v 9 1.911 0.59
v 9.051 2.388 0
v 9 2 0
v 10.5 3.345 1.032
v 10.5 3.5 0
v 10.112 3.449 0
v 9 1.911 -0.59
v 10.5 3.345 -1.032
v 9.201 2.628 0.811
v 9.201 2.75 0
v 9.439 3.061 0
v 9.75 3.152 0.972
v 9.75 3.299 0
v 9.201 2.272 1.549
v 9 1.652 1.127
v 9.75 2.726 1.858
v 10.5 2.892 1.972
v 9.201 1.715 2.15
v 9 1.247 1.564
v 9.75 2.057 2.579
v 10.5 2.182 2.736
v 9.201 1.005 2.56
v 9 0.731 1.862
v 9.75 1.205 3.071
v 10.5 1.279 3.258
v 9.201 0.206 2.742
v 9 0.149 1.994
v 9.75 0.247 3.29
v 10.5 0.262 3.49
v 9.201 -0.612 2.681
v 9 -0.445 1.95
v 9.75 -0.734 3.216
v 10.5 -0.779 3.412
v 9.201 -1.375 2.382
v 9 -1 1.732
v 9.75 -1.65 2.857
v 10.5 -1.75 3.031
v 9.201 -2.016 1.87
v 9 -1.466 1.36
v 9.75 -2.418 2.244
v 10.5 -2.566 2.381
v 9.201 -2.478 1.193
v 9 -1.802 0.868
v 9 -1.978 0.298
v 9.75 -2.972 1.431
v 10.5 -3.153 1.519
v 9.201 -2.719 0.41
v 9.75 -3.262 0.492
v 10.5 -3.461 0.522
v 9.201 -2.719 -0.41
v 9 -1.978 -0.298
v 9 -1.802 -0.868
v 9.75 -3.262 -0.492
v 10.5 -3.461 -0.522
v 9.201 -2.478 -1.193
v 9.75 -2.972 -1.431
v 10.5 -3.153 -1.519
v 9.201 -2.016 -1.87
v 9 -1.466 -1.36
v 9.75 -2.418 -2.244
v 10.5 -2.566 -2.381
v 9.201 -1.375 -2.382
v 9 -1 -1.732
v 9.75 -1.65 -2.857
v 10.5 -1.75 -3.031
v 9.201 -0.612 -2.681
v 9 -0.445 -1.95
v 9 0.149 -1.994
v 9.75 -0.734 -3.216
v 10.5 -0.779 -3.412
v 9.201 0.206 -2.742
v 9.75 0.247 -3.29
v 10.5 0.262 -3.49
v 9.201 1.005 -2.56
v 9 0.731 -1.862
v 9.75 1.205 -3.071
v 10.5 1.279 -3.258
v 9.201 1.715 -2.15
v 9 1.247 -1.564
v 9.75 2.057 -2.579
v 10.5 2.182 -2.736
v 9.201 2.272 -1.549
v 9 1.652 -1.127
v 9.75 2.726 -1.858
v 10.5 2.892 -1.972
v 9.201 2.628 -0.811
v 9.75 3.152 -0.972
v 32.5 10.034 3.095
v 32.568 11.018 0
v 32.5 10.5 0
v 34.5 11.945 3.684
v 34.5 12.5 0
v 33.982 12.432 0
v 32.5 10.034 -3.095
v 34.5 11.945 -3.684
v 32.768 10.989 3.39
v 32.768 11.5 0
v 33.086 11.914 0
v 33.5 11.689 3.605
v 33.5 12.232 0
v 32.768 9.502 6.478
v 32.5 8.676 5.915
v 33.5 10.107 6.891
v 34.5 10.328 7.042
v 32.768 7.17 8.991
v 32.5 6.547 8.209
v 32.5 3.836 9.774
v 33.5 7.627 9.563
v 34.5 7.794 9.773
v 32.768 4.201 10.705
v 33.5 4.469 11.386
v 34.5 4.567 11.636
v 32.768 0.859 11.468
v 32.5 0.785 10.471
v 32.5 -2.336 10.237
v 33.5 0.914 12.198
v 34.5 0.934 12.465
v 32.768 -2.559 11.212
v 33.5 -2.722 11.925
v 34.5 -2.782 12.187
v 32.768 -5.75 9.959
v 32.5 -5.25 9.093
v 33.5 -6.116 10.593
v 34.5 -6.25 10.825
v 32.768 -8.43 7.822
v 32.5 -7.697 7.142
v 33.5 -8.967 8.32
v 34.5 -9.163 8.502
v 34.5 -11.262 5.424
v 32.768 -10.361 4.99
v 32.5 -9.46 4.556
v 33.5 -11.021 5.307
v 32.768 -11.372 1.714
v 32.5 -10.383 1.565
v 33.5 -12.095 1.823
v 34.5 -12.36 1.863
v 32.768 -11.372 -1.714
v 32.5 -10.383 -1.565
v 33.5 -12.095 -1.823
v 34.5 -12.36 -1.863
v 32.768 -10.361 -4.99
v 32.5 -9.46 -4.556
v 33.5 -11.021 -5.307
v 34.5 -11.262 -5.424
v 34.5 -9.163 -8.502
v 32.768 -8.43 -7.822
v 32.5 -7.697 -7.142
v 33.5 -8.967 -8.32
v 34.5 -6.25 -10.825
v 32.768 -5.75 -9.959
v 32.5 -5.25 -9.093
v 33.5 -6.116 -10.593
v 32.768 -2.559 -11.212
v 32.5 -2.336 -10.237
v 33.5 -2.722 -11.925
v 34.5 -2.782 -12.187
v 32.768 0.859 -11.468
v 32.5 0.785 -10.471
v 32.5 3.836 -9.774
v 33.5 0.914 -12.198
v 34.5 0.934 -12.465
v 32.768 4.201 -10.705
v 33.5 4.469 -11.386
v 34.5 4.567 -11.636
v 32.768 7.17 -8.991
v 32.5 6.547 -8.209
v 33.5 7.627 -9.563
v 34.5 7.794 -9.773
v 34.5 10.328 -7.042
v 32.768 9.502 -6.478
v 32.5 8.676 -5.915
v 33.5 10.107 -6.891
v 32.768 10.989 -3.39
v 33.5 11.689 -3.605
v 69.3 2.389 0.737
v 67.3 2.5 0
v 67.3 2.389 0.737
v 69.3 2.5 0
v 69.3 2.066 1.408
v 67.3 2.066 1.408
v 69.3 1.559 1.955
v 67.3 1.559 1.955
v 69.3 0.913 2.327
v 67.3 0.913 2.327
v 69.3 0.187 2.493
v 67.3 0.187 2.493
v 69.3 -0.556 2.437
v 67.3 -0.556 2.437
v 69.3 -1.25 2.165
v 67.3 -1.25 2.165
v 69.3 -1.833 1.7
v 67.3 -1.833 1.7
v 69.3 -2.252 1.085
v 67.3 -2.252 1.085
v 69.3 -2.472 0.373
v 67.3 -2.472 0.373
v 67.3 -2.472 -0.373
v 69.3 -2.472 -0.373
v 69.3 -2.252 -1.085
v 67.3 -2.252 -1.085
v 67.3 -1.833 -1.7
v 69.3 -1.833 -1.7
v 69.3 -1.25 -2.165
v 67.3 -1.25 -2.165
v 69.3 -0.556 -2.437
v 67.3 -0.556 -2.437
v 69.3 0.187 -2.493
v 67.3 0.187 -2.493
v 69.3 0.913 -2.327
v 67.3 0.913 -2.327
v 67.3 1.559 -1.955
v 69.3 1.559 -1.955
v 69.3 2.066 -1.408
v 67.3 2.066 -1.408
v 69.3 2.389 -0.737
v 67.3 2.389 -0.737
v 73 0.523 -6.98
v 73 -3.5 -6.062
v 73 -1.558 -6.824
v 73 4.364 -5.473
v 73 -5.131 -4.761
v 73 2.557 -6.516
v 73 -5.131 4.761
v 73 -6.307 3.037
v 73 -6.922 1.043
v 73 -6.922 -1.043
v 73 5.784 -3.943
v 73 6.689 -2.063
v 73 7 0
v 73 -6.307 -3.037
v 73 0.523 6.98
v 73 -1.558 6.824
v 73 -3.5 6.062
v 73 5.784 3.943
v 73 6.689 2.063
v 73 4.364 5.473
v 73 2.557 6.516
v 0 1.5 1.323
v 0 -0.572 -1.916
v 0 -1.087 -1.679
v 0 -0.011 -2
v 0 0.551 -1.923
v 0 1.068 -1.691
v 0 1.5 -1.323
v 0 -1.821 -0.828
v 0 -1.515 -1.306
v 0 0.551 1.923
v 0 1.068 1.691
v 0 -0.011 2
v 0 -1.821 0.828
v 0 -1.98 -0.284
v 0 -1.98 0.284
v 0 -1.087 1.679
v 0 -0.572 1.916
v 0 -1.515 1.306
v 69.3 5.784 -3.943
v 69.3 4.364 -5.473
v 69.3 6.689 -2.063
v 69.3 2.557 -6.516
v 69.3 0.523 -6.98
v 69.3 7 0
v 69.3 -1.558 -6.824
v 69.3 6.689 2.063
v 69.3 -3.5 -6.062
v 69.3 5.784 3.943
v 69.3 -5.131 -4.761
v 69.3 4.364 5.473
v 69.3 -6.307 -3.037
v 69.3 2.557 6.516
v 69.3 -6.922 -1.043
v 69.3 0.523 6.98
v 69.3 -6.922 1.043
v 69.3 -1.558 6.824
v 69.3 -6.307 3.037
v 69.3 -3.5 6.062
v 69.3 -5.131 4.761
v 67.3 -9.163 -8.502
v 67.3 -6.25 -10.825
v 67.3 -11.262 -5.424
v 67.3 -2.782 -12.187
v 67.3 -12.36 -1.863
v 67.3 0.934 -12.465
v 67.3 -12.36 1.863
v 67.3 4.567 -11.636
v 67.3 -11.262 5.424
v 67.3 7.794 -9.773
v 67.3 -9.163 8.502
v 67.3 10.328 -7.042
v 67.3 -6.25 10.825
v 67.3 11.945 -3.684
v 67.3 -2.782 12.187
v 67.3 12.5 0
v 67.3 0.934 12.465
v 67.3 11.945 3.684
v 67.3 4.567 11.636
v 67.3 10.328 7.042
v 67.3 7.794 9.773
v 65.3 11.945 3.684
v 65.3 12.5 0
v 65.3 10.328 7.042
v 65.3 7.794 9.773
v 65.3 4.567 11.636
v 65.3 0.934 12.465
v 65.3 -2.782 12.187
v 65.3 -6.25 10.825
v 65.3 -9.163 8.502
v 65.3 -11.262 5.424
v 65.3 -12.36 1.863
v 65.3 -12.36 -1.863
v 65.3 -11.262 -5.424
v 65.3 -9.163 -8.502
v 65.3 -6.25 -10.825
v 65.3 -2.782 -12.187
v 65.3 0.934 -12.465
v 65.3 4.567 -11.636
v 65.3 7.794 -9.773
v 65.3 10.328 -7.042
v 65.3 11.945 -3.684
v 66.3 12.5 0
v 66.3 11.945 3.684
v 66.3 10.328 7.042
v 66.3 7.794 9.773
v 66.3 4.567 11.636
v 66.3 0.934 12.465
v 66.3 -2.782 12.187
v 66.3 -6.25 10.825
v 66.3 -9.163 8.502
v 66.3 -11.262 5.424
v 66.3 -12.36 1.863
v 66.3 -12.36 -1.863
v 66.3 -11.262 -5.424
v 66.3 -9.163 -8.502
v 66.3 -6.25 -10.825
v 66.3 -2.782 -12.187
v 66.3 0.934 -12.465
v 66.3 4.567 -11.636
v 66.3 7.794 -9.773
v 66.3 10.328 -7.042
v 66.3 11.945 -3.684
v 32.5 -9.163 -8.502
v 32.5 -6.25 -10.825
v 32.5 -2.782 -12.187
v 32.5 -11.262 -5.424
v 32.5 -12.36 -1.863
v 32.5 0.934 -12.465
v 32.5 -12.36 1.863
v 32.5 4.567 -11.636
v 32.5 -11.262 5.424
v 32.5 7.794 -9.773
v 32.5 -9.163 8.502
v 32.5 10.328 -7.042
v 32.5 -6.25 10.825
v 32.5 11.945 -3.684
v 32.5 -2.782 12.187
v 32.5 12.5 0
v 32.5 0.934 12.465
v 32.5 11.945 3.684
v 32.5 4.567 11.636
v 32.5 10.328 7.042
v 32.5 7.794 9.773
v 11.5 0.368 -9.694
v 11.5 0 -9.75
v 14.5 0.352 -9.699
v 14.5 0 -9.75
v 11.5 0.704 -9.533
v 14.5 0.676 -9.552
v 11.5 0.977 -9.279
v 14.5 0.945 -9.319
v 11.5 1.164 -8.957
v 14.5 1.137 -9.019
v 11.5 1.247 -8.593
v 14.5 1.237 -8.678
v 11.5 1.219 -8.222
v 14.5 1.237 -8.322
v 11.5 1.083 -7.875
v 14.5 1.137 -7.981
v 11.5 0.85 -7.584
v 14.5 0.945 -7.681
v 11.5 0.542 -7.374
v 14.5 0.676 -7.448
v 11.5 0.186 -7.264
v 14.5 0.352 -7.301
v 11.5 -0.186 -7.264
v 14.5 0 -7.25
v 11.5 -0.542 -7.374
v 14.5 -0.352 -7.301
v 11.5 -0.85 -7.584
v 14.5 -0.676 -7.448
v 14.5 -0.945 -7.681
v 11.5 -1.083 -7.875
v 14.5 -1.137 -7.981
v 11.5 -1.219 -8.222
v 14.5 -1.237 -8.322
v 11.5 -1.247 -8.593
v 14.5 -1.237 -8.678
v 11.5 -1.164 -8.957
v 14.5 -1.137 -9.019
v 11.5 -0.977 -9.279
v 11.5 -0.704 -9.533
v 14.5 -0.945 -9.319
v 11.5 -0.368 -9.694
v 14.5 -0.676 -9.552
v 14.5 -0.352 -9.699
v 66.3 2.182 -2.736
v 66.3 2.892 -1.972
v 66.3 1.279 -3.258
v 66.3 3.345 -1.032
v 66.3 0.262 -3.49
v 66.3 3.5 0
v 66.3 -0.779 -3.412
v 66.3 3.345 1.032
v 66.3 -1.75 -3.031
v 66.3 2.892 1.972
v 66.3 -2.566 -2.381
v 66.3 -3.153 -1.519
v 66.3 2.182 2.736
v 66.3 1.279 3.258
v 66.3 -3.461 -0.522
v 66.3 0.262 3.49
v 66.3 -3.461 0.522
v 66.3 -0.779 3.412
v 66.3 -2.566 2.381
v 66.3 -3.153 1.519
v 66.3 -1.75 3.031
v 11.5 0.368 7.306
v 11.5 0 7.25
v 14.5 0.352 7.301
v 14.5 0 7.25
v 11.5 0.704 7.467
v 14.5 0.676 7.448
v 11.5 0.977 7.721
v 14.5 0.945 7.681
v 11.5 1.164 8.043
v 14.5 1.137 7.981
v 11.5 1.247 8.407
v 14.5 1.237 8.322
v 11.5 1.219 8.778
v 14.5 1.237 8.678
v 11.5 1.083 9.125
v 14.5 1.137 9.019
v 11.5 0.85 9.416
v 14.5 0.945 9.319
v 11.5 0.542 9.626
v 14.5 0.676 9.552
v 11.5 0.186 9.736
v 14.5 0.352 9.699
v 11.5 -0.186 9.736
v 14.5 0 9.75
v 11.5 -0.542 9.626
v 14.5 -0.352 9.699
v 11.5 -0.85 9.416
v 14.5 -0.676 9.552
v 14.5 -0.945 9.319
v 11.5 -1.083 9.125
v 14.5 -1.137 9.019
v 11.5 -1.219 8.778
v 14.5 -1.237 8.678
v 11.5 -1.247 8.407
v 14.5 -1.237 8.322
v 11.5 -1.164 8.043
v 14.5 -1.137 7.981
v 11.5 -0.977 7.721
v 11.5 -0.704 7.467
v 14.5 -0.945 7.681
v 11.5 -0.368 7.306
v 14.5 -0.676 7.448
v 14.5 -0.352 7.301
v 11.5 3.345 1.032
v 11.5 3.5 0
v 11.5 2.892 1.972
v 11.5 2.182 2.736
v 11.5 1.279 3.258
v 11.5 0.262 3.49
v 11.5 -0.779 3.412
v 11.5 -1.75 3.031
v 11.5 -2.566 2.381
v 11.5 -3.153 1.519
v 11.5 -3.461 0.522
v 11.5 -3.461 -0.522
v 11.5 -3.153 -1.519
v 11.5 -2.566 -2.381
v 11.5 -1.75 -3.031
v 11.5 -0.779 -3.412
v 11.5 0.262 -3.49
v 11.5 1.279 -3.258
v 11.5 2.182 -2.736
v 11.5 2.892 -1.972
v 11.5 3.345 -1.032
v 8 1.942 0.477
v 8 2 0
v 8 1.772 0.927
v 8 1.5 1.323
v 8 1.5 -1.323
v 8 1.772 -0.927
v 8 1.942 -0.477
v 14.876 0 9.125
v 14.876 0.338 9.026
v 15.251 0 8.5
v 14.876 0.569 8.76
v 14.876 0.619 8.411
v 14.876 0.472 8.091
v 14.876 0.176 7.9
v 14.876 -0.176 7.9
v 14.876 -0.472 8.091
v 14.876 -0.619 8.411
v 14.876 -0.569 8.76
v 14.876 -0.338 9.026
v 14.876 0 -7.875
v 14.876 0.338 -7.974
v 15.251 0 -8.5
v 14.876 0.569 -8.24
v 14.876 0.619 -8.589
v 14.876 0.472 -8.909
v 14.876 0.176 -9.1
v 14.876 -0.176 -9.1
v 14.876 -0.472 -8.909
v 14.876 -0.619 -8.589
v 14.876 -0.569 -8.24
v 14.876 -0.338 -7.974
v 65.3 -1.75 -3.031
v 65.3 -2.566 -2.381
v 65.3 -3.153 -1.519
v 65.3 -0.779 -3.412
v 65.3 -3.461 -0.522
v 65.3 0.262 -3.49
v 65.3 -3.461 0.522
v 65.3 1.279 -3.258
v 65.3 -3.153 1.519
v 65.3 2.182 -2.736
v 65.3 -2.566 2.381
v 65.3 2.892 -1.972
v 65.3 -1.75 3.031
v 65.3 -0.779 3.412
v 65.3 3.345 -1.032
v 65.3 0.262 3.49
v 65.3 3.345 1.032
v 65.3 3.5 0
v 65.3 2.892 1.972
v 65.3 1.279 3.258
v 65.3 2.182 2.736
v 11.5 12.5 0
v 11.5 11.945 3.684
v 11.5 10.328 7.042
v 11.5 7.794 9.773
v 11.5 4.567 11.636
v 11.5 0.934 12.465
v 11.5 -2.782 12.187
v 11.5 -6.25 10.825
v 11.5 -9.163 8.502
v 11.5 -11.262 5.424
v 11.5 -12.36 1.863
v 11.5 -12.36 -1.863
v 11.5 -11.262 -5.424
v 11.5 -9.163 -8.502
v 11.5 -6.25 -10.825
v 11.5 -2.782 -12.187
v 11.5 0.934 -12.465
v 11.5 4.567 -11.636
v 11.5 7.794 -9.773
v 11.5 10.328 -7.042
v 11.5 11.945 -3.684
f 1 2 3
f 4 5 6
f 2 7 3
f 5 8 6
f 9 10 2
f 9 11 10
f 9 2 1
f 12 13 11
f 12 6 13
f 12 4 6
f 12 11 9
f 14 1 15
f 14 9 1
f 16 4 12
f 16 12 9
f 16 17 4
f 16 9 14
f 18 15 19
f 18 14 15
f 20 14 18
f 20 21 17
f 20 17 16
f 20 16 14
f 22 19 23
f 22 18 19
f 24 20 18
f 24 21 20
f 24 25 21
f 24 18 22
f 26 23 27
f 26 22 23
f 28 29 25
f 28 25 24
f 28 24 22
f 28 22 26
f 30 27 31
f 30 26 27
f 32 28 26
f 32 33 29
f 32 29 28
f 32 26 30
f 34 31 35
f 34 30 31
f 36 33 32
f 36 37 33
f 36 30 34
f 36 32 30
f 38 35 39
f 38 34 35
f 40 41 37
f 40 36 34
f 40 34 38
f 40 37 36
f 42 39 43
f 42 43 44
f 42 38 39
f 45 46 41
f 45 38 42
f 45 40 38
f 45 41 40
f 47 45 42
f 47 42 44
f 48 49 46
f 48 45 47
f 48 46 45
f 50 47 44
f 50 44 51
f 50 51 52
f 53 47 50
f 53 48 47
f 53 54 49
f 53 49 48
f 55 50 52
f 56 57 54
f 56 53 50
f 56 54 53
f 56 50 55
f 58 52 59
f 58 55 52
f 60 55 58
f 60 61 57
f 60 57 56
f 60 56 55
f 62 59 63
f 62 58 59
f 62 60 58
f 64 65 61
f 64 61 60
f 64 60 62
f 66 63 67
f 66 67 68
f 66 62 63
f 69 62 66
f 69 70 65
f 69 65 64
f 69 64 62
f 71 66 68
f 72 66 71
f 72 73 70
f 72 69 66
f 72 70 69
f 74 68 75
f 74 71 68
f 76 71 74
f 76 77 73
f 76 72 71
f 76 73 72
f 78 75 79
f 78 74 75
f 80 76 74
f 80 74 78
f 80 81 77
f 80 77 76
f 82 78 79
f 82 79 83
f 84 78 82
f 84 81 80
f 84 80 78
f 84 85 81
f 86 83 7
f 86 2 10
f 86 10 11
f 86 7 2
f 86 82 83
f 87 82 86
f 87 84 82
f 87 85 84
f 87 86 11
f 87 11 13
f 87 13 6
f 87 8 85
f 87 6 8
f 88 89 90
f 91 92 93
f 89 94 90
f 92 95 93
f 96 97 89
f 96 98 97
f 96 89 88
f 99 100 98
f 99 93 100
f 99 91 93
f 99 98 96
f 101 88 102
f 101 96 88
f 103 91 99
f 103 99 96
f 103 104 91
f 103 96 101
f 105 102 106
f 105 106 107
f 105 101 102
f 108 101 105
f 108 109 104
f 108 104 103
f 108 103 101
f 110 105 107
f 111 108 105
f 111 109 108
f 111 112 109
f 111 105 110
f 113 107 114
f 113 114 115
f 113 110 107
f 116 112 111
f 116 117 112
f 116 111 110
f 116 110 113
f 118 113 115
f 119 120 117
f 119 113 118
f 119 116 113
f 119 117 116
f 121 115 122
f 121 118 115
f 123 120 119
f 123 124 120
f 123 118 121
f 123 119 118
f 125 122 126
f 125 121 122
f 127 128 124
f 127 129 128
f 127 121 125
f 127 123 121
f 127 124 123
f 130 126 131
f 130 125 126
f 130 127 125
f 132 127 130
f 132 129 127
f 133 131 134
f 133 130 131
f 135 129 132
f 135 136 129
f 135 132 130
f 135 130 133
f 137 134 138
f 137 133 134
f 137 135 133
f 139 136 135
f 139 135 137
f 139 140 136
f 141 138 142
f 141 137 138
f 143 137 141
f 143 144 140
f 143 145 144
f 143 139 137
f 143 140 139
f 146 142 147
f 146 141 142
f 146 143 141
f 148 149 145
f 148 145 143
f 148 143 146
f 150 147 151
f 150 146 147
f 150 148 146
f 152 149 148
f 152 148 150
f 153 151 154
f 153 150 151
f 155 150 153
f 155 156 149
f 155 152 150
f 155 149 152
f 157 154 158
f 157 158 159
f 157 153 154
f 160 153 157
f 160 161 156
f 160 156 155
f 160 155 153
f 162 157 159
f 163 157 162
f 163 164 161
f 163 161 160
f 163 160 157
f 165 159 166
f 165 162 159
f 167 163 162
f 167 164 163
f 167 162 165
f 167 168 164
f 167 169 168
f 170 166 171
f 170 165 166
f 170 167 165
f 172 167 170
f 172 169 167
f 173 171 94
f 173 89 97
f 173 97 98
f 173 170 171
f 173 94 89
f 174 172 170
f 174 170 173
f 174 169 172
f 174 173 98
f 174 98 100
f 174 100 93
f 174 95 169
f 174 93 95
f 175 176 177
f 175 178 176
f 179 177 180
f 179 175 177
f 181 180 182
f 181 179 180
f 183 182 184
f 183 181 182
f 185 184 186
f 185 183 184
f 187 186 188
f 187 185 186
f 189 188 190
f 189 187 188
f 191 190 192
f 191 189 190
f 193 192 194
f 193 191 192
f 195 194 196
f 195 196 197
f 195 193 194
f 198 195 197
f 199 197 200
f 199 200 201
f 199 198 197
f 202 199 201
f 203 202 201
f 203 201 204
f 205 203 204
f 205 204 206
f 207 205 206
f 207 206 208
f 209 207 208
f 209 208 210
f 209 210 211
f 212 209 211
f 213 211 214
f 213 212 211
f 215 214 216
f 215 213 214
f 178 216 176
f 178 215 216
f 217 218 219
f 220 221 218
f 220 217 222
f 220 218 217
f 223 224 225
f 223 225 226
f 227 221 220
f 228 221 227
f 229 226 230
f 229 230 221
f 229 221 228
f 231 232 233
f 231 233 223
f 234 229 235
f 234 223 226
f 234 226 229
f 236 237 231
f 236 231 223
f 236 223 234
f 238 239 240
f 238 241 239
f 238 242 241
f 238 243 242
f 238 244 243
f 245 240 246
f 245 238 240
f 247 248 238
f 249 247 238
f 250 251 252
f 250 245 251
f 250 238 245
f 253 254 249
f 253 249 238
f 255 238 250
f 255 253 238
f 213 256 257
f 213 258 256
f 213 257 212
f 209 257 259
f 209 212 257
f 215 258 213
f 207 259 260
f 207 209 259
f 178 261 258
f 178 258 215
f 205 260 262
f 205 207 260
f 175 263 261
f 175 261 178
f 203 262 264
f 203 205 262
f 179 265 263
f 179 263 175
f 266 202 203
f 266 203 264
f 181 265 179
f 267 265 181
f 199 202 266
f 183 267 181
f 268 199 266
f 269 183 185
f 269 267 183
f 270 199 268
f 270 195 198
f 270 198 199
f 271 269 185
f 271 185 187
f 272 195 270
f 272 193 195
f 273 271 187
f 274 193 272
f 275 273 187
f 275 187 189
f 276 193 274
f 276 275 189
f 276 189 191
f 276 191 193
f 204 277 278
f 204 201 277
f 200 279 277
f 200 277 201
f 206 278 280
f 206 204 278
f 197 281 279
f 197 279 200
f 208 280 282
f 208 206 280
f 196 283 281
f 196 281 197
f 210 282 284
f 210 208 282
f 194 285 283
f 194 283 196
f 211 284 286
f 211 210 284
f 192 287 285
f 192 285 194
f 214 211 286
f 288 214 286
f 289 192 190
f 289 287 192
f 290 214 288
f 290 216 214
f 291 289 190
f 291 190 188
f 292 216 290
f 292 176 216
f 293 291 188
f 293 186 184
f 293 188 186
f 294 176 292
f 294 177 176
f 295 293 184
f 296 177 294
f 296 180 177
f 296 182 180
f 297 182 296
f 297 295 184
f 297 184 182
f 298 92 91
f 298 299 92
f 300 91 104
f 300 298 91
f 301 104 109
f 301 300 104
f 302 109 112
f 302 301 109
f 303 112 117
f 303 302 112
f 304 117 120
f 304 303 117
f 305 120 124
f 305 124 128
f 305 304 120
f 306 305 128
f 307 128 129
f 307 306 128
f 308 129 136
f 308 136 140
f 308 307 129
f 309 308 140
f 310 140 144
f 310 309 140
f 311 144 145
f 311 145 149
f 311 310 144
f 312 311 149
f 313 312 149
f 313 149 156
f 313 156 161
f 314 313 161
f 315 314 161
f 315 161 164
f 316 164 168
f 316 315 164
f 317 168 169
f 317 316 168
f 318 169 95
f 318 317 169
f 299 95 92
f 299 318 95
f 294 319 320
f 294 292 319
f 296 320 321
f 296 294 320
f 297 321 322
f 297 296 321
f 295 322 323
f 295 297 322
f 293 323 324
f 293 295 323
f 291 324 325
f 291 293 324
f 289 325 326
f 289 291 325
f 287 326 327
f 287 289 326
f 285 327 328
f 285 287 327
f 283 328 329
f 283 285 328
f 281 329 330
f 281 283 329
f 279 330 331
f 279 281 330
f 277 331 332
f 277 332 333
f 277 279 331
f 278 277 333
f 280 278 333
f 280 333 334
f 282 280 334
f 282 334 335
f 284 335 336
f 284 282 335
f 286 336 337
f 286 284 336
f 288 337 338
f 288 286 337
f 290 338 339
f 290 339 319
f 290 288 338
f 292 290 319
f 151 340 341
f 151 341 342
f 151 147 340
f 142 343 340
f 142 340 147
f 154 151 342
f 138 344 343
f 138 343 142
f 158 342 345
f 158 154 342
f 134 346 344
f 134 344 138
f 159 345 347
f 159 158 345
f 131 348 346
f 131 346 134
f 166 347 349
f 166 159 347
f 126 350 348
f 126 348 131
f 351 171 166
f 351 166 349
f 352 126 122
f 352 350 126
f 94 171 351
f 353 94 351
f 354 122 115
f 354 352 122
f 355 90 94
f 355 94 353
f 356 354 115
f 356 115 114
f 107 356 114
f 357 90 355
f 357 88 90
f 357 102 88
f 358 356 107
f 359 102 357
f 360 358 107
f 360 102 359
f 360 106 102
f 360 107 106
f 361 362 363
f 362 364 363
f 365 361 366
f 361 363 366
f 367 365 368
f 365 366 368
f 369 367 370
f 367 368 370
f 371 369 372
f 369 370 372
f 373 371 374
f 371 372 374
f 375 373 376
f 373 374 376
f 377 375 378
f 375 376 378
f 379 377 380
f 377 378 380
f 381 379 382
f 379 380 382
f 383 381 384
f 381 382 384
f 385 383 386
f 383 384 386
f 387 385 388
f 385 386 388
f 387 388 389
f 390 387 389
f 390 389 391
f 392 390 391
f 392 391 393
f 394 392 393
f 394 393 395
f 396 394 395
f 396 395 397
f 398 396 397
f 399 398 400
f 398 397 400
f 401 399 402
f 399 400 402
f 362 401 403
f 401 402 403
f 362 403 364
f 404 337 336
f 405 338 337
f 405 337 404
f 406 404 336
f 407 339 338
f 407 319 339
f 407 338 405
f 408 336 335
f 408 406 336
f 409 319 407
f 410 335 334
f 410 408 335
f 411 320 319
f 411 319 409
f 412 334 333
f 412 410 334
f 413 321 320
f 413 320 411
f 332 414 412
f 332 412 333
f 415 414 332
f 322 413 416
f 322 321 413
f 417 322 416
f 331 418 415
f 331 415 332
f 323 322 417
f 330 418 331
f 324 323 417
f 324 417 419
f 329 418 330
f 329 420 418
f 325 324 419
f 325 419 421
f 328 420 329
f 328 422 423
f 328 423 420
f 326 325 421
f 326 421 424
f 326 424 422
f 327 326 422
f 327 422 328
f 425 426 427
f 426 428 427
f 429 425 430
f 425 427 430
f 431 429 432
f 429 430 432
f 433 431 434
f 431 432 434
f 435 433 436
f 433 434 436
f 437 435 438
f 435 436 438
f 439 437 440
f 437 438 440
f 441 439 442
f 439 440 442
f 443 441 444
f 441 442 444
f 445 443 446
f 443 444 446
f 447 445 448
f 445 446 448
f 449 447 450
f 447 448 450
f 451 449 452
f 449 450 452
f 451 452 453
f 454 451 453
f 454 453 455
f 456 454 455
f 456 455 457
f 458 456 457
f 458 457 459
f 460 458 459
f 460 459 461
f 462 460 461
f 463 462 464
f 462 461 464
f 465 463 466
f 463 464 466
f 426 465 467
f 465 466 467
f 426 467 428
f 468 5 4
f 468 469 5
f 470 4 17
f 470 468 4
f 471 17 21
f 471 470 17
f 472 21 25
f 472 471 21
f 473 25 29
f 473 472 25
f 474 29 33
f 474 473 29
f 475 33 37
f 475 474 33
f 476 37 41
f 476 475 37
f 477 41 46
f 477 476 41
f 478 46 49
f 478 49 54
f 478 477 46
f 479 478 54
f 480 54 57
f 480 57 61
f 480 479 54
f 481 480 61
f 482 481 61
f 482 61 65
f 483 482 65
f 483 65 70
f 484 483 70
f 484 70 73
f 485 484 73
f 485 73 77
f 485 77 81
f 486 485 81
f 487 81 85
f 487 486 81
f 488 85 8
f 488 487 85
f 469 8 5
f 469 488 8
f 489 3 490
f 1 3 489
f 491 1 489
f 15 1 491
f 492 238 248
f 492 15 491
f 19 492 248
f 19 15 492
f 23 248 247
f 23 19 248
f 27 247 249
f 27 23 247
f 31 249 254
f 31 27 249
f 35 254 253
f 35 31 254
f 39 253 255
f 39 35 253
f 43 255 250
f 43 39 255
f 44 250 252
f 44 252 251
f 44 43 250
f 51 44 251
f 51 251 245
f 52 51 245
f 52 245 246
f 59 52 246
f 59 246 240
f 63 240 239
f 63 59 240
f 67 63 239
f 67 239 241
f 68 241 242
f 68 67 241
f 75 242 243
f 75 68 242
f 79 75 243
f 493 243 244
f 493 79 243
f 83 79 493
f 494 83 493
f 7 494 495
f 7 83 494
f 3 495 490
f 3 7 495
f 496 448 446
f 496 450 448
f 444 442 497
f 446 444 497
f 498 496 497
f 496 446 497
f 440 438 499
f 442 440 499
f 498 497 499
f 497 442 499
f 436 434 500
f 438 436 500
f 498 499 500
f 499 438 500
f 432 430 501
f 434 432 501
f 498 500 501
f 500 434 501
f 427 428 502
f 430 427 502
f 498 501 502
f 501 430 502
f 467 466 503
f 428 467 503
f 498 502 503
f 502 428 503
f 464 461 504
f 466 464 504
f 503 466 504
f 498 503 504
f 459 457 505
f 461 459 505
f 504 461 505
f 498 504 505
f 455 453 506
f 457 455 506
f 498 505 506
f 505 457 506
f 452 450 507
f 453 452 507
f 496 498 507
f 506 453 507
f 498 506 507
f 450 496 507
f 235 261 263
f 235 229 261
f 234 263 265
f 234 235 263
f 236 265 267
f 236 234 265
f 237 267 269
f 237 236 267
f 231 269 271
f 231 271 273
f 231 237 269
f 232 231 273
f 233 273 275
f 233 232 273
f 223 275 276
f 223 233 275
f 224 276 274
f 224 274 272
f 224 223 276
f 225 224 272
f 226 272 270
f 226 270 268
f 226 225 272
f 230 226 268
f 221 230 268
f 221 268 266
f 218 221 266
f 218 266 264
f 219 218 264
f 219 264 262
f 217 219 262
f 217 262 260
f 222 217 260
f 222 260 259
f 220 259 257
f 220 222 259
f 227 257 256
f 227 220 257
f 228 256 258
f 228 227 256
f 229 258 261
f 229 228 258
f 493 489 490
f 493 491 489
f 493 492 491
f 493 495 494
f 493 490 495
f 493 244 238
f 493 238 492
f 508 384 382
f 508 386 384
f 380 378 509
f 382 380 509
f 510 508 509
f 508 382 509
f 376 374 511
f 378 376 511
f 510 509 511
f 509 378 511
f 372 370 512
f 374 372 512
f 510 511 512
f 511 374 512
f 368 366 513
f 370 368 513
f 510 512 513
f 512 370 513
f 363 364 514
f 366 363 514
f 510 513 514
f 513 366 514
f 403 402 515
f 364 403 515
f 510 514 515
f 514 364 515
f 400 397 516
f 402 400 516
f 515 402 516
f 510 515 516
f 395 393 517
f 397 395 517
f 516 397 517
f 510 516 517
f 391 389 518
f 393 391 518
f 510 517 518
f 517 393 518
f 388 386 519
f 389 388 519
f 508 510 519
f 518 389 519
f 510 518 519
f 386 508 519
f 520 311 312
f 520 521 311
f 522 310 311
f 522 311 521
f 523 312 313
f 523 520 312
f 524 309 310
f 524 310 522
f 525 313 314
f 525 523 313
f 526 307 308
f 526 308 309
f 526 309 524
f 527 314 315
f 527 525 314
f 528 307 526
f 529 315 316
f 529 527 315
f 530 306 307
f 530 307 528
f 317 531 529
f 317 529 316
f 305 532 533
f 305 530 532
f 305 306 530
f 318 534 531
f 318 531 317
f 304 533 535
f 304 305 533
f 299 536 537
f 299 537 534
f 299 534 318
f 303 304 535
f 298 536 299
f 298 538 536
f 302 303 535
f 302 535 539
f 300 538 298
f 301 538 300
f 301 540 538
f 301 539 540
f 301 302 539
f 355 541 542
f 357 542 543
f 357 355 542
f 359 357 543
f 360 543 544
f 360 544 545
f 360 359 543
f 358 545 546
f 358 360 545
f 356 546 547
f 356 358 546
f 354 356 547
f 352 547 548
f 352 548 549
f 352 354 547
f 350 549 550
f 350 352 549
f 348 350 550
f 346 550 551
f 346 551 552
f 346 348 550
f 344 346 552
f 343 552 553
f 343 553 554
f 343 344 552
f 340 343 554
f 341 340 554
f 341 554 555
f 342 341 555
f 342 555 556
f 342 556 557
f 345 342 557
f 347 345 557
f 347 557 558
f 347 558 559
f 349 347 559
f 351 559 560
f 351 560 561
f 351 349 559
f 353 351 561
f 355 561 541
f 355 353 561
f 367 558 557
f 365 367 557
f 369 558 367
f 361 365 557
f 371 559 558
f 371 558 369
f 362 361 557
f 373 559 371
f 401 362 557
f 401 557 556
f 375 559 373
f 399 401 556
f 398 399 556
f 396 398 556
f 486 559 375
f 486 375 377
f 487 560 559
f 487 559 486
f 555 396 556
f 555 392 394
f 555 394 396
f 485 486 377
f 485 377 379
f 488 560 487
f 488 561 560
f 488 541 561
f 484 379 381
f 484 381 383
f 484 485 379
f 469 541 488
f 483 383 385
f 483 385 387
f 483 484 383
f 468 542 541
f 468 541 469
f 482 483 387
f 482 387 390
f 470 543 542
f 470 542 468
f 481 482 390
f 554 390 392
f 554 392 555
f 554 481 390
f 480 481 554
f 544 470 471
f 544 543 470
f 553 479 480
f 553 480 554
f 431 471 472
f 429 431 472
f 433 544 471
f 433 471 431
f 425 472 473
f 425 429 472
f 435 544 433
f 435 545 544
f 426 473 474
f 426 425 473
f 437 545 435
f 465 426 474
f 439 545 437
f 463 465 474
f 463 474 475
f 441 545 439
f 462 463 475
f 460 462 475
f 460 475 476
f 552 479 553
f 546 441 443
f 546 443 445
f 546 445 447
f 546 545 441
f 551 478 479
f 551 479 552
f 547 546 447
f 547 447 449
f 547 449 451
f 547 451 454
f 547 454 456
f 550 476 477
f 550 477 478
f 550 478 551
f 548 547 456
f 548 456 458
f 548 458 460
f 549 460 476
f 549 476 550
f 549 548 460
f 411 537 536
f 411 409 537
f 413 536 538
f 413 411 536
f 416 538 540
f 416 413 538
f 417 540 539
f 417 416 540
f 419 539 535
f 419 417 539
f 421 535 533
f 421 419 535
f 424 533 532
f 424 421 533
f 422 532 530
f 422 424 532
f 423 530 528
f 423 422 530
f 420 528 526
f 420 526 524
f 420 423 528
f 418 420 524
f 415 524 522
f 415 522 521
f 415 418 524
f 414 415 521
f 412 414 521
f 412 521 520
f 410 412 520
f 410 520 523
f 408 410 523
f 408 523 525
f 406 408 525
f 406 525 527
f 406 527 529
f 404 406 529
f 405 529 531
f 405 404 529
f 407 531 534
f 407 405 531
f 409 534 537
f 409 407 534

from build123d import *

# Parameters (mm, degrees)
TAP_DRILL_FOR_M3X0_5_TAP1_D     = 2.5
TAP_DRILL_FOR_M3X0_5_TAP1_DEPTH = 3
TAP_DRILL_FOR_M3X0_5_TAP1_TIP   = 0.751075774
SKETCH5_W                       = 8
SKETCH5_H                       = 0.5
CUT_EXTRUDE1_DEPTH              = 13.5
CUT_EXTRUDE1_DEPTH_BACK         = 13.5


with BuildPart() as part:
    # Sketch1 → Revolve1 (revolve)
    with BuildSketch(Plane.XY):
        with BuildLine():
            Line((0, 0), (0, 2))
            Line((0, 2), (9, 2))
            ThreePointArc((9, 2), (9.439339828, 3.060660172), (10.5, 3.5))
            Line((10.5, 3.5), (11.5, 3.5))
            Line((11.5, 3.5), (11.5, 12.5))
            Line((11.5, 12.5), (32.5, 12.5))
            Line((32.5, 12.5), (32.5, 10.5))
            ThreePointArc((32.5, 10.5), (33.085786438, 11.914213562), (34.5, 12.5))
            Line((34.5, 12.5), (65.3, 12.5))
            Line((65.3, 12.5), (65.3, 3.5))
            Line((65.3, 3.5), (66.3, 3.5))
            Line((66.3, 3.5), (66.3, 12.5))
            Line((66.3, 12.5), (67.3, 12.5))
            Line((67.3, 12.5), (67.3, 2.5))
            Line((67.3, 2.5), (69.3, 2.5))
            Line((69.3, 2.5), (69.3, 7))
            Line((69.3, 7), (73, 7))
            Line((73, 7), (73, 0))
            Line((73, 0), (0, 0))
        make_face()
    revolve(axis=Axis((0, 0, 0), (1, 0, 0)))

    # Tap Drill for M3x0.5 Tap1
    with Locations(Plane.ZY.offset(-11.5)):
        with Locations((-8.5, 0), (8.5, 0)):
            Hole(TAP_DRILL_FOR_M3X0_5_TAP1_D / 2, depth=TAP_DRILL_FOR_M3X0_5_TAP1_DEPTH)
            with Locations((0, 0, -(TAP_DRILL_FOR_M3X0_5_TAP1_DEPTH + TAP_DRILL_FOR_M3X0_5_TAP1_TIP / 2))):  # 118° drill point
                Cone(0, TAP_DRILL_FOR_M3X0_5_TAP1_D / 2, TAP_DRILL_FOR_M3X0_5_TAP1_TIP, mode=Mode.SUBTRACT)

    # Sketch5 → Cut-Extrude1 (cut, two sides)
    with BuildSketch(Plane.XY) as cut_extrude1_sk:
        with Locations((4, 1.75)):
            Rectangle(SKETCH5_W, SKETCH5_H)
    extrude(amount=CUT_EXTRUDE1_DEPTH, mode=Mode.SUBTRACT)
    extrude(cut_extrude1_sk.sketch, amount=-CUT_EXTRUDE1_DEPTH_BACK, mode=Mode.SUBTRACT)


solid = part.part
